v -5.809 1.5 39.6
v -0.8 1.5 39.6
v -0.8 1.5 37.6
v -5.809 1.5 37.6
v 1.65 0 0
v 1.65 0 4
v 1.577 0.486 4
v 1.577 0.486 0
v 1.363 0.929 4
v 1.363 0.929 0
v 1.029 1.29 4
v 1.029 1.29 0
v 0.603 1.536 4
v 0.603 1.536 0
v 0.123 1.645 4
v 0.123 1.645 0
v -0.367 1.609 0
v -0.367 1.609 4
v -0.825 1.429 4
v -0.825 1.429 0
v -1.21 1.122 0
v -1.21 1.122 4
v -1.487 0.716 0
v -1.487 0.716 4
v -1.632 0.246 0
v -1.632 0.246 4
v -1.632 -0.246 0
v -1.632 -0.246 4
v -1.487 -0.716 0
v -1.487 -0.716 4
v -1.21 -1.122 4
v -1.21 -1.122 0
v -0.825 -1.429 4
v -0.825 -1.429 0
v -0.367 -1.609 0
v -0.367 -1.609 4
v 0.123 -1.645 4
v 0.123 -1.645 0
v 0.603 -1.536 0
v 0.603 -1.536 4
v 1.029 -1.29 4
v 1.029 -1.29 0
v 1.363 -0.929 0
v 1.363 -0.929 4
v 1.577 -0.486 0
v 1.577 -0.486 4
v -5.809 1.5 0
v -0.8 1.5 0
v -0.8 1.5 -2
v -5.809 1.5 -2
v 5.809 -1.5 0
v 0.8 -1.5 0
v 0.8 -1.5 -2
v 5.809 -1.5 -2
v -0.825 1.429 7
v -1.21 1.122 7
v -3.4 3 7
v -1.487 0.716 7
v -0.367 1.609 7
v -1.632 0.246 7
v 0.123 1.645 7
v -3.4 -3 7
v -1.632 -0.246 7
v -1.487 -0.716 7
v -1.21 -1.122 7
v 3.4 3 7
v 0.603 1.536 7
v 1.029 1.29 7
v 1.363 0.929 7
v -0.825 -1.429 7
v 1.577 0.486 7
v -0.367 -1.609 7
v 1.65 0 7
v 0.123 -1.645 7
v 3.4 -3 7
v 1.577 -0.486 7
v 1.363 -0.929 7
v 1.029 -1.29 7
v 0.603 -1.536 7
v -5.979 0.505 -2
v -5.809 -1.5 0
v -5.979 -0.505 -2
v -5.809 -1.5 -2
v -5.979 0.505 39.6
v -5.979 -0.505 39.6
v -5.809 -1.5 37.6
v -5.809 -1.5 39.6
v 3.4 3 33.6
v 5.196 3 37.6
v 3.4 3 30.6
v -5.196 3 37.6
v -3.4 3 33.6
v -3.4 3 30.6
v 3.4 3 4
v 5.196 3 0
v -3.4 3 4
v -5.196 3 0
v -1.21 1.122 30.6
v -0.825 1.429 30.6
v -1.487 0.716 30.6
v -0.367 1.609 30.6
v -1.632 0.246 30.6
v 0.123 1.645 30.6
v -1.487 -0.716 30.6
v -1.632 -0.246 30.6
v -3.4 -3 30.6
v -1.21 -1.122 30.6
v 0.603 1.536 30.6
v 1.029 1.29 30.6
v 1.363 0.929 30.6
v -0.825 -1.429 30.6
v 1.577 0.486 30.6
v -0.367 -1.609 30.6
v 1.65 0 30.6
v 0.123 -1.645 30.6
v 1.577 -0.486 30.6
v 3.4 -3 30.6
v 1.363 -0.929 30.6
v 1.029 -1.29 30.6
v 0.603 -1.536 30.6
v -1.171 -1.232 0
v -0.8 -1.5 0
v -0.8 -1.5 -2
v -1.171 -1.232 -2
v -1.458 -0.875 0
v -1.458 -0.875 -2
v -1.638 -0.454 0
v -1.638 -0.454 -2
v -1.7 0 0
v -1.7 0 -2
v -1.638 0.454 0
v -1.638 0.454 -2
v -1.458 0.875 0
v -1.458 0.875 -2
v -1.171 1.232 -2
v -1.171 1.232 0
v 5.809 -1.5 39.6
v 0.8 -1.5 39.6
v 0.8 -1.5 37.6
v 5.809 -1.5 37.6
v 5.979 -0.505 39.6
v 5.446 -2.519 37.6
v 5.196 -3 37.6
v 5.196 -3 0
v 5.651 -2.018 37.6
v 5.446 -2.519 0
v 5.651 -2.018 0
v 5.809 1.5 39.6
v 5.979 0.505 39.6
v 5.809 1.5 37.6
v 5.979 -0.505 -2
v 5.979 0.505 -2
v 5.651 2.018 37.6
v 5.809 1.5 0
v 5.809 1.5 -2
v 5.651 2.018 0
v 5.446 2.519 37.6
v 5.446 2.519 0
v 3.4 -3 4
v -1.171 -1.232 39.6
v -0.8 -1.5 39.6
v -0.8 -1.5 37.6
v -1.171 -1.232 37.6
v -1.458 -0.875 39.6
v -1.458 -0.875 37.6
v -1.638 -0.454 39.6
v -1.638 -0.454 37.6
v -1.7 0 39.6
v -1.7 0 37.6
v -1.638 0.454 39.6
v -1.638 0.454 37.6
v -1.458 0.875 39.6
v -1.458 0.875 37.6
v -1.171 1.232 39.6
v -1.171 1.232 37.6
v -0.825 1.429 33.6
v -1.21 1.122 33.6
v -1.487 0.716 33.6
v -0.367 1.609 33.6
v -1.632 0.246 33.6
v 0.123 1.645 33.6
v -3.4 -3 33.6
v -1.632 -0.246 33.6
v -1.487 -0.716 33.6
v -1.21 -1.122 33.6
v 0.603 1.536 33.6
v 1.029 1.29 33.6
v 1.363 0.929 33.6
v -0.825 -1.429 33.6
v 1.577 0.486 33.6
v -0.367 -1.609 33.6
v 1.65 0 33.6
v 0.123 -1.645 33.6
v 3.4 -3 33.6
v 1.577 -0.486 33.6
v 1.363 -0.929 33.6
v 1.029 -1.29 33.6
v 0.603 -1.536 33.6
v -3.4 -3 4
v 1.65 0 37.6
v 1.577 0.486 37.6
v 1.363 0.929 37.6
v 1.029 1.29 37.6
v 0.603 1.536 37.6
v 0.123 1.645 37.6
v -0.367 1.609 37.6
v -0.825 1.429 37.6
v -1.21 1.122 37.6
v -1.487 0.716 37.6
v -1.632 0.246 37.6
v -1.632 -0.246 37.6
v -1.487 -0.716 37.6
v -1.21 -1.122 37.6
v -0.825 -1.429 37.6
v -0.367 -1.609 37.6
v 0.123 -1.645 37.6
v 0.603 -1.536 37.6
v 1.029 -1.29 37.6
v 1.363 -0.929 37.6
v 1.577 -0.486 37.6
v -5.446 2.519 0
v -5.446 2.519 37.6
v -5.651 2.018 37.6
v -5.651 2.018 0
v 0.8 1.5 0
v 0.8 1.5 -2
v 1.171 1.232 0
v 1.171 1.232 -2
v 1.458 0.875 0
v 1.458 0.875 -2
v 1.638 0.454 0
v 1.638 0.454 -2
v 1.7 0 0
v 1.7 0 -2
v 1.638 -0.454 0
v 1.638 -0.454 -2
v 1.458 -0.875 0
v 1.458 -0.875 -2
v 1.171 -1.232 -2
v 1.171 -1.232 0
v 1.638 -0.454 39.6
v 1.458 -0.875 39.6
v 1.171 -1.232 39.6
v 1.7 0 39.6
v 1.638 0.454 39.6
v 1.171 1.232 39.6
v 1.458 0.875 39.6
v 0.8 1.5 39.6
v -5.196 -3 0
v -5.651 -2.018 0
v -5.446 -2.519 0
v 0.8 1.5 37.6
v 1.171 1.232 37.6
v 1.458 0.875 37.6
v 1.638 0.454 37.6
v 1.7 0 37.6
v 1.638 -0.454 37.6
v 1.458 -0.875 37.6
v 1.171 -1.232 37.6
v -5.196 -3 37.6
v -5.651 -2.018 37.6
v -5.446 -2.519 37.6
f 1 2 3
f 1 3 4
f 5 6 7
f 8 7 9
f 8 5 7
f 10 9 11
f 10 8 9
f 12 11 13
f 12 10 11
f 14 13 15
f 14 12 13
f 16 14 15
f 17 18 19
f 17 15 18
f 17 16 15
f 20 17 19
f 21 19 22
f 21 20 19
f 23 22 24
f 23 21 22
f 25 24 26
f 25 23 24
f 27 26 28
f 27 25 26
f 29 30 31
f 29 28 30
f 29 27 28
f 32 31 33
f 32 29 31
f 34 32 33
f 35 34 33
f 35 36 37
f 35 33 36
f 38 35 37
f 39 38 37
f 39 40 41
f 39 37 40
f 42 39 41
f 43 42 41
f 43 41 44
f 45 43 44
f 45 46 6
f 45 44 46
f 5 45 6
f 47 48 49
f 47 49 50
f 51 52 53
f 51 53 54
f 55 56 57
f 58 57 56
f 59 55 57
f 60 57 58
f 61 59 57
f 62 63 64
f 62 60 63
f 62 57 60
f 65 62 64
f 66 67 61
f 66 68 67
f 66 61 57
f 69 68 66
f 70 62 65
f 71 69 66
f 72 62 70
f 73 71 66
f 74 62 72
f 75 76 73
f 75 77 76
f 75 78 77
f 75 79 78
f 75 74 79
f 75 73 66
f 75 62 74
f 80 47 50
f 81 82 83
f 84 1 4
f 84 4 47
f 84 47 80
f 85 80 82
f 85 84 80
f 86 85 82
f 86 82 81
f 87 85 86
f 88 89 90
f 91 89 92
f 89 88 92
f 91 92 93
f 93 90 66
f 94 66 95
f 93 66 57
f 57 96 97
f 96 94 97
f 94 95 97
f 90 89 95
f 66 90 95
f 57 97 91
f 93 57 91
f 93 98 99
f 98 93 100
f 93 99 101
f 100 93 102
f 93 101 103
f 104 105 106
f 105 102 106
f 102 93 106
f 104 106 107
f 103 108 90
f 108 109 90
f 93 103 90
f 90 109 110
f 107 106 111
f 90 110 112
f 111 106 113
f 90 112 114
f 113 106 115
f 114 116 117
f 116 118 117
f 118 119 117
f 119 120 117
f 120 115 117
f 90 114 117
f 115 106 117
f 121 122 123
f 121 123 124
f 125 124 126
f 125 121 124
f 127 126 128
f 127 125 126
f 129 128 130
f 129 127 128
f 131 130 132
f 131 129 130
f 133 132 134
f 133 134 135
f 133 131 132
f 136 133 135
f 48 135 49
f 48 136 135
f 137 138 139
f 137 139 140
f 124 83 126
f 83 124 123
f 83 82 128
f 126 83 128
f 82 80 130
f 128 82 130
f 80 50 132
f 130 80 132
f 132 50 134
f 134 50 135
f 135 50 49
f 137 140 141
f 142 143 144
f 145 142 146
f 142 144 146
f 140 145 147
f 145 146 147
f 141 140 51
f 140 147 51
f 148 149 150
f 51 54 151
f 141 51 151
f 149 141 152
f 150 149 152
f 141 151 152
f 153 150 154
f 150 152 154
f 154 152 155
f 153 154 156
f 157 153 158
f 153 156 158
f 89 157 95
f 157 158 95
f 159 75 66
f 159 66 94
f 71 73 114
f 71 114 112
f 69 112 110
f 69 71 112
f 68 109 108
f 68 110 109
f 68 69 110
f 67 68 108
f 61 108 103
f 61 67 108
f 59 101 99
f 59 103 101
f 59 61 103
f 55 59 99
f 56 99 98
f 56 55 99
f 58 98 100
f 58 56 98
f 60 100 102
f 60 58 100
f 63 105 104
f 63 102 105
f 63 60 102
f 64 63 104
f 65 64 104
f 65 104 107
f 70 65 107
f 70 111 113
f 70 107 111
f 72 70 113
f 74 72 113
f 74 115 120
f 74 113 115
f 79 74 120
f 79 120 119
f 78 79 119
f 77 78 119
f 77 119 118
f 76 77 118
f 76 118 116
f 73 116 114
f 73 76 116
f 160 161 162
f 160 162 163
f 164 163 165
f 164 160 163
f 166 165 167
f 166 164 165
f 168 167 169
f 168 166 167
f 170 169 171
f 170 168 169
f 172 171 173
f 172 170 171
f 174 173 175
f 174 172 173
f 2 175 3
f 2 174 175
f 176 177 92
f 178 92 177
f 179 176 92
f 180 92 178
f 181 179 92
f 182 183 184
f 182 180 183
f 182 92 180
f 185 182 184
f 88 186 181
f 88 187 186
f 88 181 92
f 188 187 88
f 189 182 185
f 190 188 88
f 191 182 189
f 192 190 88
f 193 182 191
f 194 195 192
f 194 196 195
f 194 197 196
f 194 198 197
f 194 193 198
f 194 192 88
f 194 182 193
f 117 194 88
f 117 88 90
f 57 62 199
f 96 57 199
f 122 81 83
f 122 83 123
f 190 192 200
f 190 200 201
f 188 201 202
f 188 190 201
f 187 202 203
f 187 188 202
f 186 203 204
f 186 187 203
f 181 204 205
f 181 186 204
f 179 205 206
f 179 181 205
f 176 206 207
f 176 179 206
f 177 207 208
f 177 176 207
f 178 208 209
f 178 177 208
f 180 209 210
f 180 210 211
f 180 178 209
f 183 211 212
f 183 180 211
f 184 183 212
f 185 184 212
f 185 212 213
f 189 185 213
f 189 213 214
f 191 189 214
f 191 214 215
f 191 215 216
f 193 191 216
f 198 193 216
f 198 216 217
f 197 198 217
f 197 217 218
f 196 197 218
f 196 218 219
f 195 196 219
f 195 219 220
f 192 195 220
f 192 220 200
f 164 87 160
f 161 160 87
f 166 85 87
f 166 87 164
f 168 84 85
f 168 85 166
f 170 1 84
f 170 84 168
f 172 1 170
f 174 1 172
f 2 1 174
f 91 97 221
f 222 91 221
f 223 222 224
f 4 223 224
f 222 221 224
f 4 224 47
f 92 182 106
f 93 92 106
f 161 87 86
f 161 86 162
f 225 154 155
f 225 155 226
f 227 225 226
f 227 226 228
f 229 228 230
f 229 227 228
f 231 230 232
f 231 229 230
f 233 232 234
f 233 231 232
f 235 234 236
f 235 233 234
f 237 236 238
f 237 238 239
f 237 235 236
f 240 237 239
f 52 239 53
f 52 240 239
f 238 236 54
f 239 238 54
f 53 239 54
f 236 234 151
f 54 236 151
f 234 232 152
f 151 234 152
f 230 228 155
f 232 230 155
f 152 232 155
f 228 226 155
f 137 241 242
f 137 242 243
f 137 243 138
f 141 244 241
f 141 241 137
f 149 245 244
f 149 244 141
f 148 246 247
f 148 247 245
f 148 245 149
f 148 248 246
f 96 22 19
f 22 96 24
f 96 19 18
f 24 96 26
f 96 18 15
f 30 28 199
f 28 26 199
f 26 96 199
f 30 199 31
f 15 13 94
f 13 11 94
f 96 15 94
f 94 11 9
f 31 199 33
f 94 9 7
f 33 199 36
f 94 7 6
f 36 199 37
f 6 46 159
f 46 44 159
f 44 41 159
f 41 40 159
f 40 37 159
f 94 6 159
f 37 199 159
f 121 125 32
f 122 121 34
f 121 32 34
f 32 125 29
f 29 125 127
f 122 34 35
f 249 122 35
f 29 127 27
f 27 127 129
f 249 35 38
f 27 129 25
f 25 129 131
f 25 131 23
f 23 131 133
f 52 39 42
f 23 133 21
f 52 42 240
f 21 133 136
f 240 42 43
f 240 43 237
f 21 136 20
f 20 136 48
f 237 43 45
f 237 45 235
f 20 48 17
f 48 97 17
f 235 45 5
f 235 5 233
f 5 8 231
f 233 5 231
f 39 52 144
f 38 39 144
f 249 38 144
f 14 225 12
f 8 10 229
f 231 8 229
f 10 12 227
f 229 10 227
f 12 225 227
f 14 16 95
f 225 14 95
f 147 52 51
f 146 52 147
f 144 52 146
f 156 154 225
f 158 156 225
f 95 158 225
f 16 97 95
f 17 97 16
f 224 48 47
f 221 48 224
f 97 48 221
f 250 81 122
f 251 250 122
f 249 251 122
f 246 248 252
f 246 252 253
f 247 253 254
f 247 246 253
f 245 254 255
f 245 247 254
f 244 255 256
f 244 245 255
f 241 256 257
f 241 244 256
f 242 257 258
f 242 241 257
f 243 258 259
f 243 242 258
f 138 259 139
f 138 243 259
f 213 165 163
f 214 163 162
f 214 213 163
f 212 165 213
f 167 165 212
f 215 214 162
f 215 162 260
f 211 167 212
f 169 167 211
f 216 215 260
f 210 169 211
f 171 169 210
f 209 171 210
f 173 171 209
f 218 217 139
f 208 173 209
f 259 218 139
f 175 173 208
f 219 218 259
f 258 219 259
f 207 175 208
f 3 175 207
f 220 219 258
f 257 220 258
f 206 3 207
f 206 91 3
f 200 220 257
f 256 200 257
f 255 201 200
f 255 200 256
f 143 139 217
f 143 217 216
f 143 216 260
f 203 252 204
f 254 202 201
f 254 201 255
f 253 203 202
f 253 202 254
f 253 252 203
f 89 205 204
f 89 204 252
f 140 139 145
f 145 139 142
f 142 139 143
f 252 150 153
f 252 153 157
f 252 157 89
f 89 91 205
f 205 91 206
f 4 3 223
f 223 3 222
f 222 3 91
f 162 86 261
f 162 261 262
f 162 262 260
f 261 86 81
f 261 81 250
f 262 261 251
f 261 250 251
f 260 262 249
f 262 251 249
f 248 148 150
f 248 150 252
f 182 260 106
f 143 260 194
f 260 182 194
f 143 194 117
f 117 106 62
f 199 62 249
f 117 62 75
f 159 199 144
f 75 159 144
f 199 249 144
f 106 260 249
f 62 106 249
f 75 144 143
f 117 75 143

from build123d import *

# Parameters (mm, degrees)
ESBO_O1_R                     = 1.65
RESSALTO_EXTRUS_O1_DEPTH      = 37.6
RESSALTO_EXTRUS_O2_DEPTH      = 2
RESSALTO_EXTRUS_O2_DEPTH_BACK = 39.6
CORTE_EXTRUS_O1_DEPTH         = 41.164163131
CORTE_EXTRUS_O1_DEPTH_BACK    = 41.164163131
ESBO_O2_W                     = 6.8
ESBO_O2_H                     = 3


with BuildPart() as part:
    # Esboço1 → Ressalto-extrusão1 (new body)
    with BuildSketch(Plane.XY):
        with BuildLine():
            Line((-5.196152423, -3), (5.196152423, -3))
            ThreePointArc((5.196152423, -3), (6, 0), (5.196152423, 3))
            Line((5.196152423, 3), (-5.196152423, 3))
            ThreePointArc((-5.196152423, 3), (-6, 0), (-5.196152423, -3))
        make_face()
        Circle(ESBO_O1_R, mode=Mode.SUBTRACT)
    extrude(amount=RESSALTO_EXTRUS_O1_DEPTH)

    # Esboço3 → Ressalto-extrusão2 (add, two sides: drawn at the far end of the back side and taken through both)
    with BuildSketch(Plane(origin=(0, 0, 0), x_dir=(-1, 0, 0), z_dir=(0, 0, -1)).offset(-RESSALTO_EXTRUS_O2_DEPTH_BACK)):
        with BuildLine():
            Line((0.8, 1.5), (5.809475019, 1.5))
            ThreePointArc((5.809475019, 1.5), (6, 0), (5.809475019, -1.5))
            Line((5.809475019, -1.5), (0.8, -1.5))
            ThreePointArc((0.8, -1.5), (1.7, 0), (0.8, 1.5))
        make_face()
        with BuildLine():
            Line((-5.809475019, 1.5), (-0.8, 1.5))
            ThreePointArc((-0.8, 1.5), (-1.7, 0), (-0.8, -1.5))
            Line((-0.8, -1.5), (-5.809475019, -1.5))
            ThreePointArc((-5.809475019, -1.5), (-6, 0), (-5.809475019, 1.5))
        make_face()
    extrude(amount=RESSALTO_EXTRUS_O2_DEPTH + RESSALTO_EXTRUS_O2_DEPTH_BACK)

    # Esboço2 → Corte-extrusão1 (cut, two sides: drawn at the far end of the back side and taken through both)
    with BuildSketch(Plane(origin=(0, 0, 0), x_dir=(1, 0, 0), z_dir=(0, 1, 0)).offset(-CORTE_EXTRUS_O1_DEPTH_BACK)):
        with Locations((0, -5.5)):
            Rectangle(ESBO_O2_W, ESBO_O2_H)
        with Locations((0, -5.5)):
            Rectangle(ESBO_O2_W, ESBO_O2_H)
        with Locations((0, -32.1)):
            Rectangle(ESBO_O2_W, ESBO_O2_H)
        with Locations((0, -32.1)):
            Rectangle(ESBO_O2_W, ESBO_O2_H)
    extrude(amount=CORTE_EXTRUS_O1_DEPTH + CORTE_EXTRUS_O1_DEPTH_BACK, mode=Mode.SUBTRACT)


solid = part.part
